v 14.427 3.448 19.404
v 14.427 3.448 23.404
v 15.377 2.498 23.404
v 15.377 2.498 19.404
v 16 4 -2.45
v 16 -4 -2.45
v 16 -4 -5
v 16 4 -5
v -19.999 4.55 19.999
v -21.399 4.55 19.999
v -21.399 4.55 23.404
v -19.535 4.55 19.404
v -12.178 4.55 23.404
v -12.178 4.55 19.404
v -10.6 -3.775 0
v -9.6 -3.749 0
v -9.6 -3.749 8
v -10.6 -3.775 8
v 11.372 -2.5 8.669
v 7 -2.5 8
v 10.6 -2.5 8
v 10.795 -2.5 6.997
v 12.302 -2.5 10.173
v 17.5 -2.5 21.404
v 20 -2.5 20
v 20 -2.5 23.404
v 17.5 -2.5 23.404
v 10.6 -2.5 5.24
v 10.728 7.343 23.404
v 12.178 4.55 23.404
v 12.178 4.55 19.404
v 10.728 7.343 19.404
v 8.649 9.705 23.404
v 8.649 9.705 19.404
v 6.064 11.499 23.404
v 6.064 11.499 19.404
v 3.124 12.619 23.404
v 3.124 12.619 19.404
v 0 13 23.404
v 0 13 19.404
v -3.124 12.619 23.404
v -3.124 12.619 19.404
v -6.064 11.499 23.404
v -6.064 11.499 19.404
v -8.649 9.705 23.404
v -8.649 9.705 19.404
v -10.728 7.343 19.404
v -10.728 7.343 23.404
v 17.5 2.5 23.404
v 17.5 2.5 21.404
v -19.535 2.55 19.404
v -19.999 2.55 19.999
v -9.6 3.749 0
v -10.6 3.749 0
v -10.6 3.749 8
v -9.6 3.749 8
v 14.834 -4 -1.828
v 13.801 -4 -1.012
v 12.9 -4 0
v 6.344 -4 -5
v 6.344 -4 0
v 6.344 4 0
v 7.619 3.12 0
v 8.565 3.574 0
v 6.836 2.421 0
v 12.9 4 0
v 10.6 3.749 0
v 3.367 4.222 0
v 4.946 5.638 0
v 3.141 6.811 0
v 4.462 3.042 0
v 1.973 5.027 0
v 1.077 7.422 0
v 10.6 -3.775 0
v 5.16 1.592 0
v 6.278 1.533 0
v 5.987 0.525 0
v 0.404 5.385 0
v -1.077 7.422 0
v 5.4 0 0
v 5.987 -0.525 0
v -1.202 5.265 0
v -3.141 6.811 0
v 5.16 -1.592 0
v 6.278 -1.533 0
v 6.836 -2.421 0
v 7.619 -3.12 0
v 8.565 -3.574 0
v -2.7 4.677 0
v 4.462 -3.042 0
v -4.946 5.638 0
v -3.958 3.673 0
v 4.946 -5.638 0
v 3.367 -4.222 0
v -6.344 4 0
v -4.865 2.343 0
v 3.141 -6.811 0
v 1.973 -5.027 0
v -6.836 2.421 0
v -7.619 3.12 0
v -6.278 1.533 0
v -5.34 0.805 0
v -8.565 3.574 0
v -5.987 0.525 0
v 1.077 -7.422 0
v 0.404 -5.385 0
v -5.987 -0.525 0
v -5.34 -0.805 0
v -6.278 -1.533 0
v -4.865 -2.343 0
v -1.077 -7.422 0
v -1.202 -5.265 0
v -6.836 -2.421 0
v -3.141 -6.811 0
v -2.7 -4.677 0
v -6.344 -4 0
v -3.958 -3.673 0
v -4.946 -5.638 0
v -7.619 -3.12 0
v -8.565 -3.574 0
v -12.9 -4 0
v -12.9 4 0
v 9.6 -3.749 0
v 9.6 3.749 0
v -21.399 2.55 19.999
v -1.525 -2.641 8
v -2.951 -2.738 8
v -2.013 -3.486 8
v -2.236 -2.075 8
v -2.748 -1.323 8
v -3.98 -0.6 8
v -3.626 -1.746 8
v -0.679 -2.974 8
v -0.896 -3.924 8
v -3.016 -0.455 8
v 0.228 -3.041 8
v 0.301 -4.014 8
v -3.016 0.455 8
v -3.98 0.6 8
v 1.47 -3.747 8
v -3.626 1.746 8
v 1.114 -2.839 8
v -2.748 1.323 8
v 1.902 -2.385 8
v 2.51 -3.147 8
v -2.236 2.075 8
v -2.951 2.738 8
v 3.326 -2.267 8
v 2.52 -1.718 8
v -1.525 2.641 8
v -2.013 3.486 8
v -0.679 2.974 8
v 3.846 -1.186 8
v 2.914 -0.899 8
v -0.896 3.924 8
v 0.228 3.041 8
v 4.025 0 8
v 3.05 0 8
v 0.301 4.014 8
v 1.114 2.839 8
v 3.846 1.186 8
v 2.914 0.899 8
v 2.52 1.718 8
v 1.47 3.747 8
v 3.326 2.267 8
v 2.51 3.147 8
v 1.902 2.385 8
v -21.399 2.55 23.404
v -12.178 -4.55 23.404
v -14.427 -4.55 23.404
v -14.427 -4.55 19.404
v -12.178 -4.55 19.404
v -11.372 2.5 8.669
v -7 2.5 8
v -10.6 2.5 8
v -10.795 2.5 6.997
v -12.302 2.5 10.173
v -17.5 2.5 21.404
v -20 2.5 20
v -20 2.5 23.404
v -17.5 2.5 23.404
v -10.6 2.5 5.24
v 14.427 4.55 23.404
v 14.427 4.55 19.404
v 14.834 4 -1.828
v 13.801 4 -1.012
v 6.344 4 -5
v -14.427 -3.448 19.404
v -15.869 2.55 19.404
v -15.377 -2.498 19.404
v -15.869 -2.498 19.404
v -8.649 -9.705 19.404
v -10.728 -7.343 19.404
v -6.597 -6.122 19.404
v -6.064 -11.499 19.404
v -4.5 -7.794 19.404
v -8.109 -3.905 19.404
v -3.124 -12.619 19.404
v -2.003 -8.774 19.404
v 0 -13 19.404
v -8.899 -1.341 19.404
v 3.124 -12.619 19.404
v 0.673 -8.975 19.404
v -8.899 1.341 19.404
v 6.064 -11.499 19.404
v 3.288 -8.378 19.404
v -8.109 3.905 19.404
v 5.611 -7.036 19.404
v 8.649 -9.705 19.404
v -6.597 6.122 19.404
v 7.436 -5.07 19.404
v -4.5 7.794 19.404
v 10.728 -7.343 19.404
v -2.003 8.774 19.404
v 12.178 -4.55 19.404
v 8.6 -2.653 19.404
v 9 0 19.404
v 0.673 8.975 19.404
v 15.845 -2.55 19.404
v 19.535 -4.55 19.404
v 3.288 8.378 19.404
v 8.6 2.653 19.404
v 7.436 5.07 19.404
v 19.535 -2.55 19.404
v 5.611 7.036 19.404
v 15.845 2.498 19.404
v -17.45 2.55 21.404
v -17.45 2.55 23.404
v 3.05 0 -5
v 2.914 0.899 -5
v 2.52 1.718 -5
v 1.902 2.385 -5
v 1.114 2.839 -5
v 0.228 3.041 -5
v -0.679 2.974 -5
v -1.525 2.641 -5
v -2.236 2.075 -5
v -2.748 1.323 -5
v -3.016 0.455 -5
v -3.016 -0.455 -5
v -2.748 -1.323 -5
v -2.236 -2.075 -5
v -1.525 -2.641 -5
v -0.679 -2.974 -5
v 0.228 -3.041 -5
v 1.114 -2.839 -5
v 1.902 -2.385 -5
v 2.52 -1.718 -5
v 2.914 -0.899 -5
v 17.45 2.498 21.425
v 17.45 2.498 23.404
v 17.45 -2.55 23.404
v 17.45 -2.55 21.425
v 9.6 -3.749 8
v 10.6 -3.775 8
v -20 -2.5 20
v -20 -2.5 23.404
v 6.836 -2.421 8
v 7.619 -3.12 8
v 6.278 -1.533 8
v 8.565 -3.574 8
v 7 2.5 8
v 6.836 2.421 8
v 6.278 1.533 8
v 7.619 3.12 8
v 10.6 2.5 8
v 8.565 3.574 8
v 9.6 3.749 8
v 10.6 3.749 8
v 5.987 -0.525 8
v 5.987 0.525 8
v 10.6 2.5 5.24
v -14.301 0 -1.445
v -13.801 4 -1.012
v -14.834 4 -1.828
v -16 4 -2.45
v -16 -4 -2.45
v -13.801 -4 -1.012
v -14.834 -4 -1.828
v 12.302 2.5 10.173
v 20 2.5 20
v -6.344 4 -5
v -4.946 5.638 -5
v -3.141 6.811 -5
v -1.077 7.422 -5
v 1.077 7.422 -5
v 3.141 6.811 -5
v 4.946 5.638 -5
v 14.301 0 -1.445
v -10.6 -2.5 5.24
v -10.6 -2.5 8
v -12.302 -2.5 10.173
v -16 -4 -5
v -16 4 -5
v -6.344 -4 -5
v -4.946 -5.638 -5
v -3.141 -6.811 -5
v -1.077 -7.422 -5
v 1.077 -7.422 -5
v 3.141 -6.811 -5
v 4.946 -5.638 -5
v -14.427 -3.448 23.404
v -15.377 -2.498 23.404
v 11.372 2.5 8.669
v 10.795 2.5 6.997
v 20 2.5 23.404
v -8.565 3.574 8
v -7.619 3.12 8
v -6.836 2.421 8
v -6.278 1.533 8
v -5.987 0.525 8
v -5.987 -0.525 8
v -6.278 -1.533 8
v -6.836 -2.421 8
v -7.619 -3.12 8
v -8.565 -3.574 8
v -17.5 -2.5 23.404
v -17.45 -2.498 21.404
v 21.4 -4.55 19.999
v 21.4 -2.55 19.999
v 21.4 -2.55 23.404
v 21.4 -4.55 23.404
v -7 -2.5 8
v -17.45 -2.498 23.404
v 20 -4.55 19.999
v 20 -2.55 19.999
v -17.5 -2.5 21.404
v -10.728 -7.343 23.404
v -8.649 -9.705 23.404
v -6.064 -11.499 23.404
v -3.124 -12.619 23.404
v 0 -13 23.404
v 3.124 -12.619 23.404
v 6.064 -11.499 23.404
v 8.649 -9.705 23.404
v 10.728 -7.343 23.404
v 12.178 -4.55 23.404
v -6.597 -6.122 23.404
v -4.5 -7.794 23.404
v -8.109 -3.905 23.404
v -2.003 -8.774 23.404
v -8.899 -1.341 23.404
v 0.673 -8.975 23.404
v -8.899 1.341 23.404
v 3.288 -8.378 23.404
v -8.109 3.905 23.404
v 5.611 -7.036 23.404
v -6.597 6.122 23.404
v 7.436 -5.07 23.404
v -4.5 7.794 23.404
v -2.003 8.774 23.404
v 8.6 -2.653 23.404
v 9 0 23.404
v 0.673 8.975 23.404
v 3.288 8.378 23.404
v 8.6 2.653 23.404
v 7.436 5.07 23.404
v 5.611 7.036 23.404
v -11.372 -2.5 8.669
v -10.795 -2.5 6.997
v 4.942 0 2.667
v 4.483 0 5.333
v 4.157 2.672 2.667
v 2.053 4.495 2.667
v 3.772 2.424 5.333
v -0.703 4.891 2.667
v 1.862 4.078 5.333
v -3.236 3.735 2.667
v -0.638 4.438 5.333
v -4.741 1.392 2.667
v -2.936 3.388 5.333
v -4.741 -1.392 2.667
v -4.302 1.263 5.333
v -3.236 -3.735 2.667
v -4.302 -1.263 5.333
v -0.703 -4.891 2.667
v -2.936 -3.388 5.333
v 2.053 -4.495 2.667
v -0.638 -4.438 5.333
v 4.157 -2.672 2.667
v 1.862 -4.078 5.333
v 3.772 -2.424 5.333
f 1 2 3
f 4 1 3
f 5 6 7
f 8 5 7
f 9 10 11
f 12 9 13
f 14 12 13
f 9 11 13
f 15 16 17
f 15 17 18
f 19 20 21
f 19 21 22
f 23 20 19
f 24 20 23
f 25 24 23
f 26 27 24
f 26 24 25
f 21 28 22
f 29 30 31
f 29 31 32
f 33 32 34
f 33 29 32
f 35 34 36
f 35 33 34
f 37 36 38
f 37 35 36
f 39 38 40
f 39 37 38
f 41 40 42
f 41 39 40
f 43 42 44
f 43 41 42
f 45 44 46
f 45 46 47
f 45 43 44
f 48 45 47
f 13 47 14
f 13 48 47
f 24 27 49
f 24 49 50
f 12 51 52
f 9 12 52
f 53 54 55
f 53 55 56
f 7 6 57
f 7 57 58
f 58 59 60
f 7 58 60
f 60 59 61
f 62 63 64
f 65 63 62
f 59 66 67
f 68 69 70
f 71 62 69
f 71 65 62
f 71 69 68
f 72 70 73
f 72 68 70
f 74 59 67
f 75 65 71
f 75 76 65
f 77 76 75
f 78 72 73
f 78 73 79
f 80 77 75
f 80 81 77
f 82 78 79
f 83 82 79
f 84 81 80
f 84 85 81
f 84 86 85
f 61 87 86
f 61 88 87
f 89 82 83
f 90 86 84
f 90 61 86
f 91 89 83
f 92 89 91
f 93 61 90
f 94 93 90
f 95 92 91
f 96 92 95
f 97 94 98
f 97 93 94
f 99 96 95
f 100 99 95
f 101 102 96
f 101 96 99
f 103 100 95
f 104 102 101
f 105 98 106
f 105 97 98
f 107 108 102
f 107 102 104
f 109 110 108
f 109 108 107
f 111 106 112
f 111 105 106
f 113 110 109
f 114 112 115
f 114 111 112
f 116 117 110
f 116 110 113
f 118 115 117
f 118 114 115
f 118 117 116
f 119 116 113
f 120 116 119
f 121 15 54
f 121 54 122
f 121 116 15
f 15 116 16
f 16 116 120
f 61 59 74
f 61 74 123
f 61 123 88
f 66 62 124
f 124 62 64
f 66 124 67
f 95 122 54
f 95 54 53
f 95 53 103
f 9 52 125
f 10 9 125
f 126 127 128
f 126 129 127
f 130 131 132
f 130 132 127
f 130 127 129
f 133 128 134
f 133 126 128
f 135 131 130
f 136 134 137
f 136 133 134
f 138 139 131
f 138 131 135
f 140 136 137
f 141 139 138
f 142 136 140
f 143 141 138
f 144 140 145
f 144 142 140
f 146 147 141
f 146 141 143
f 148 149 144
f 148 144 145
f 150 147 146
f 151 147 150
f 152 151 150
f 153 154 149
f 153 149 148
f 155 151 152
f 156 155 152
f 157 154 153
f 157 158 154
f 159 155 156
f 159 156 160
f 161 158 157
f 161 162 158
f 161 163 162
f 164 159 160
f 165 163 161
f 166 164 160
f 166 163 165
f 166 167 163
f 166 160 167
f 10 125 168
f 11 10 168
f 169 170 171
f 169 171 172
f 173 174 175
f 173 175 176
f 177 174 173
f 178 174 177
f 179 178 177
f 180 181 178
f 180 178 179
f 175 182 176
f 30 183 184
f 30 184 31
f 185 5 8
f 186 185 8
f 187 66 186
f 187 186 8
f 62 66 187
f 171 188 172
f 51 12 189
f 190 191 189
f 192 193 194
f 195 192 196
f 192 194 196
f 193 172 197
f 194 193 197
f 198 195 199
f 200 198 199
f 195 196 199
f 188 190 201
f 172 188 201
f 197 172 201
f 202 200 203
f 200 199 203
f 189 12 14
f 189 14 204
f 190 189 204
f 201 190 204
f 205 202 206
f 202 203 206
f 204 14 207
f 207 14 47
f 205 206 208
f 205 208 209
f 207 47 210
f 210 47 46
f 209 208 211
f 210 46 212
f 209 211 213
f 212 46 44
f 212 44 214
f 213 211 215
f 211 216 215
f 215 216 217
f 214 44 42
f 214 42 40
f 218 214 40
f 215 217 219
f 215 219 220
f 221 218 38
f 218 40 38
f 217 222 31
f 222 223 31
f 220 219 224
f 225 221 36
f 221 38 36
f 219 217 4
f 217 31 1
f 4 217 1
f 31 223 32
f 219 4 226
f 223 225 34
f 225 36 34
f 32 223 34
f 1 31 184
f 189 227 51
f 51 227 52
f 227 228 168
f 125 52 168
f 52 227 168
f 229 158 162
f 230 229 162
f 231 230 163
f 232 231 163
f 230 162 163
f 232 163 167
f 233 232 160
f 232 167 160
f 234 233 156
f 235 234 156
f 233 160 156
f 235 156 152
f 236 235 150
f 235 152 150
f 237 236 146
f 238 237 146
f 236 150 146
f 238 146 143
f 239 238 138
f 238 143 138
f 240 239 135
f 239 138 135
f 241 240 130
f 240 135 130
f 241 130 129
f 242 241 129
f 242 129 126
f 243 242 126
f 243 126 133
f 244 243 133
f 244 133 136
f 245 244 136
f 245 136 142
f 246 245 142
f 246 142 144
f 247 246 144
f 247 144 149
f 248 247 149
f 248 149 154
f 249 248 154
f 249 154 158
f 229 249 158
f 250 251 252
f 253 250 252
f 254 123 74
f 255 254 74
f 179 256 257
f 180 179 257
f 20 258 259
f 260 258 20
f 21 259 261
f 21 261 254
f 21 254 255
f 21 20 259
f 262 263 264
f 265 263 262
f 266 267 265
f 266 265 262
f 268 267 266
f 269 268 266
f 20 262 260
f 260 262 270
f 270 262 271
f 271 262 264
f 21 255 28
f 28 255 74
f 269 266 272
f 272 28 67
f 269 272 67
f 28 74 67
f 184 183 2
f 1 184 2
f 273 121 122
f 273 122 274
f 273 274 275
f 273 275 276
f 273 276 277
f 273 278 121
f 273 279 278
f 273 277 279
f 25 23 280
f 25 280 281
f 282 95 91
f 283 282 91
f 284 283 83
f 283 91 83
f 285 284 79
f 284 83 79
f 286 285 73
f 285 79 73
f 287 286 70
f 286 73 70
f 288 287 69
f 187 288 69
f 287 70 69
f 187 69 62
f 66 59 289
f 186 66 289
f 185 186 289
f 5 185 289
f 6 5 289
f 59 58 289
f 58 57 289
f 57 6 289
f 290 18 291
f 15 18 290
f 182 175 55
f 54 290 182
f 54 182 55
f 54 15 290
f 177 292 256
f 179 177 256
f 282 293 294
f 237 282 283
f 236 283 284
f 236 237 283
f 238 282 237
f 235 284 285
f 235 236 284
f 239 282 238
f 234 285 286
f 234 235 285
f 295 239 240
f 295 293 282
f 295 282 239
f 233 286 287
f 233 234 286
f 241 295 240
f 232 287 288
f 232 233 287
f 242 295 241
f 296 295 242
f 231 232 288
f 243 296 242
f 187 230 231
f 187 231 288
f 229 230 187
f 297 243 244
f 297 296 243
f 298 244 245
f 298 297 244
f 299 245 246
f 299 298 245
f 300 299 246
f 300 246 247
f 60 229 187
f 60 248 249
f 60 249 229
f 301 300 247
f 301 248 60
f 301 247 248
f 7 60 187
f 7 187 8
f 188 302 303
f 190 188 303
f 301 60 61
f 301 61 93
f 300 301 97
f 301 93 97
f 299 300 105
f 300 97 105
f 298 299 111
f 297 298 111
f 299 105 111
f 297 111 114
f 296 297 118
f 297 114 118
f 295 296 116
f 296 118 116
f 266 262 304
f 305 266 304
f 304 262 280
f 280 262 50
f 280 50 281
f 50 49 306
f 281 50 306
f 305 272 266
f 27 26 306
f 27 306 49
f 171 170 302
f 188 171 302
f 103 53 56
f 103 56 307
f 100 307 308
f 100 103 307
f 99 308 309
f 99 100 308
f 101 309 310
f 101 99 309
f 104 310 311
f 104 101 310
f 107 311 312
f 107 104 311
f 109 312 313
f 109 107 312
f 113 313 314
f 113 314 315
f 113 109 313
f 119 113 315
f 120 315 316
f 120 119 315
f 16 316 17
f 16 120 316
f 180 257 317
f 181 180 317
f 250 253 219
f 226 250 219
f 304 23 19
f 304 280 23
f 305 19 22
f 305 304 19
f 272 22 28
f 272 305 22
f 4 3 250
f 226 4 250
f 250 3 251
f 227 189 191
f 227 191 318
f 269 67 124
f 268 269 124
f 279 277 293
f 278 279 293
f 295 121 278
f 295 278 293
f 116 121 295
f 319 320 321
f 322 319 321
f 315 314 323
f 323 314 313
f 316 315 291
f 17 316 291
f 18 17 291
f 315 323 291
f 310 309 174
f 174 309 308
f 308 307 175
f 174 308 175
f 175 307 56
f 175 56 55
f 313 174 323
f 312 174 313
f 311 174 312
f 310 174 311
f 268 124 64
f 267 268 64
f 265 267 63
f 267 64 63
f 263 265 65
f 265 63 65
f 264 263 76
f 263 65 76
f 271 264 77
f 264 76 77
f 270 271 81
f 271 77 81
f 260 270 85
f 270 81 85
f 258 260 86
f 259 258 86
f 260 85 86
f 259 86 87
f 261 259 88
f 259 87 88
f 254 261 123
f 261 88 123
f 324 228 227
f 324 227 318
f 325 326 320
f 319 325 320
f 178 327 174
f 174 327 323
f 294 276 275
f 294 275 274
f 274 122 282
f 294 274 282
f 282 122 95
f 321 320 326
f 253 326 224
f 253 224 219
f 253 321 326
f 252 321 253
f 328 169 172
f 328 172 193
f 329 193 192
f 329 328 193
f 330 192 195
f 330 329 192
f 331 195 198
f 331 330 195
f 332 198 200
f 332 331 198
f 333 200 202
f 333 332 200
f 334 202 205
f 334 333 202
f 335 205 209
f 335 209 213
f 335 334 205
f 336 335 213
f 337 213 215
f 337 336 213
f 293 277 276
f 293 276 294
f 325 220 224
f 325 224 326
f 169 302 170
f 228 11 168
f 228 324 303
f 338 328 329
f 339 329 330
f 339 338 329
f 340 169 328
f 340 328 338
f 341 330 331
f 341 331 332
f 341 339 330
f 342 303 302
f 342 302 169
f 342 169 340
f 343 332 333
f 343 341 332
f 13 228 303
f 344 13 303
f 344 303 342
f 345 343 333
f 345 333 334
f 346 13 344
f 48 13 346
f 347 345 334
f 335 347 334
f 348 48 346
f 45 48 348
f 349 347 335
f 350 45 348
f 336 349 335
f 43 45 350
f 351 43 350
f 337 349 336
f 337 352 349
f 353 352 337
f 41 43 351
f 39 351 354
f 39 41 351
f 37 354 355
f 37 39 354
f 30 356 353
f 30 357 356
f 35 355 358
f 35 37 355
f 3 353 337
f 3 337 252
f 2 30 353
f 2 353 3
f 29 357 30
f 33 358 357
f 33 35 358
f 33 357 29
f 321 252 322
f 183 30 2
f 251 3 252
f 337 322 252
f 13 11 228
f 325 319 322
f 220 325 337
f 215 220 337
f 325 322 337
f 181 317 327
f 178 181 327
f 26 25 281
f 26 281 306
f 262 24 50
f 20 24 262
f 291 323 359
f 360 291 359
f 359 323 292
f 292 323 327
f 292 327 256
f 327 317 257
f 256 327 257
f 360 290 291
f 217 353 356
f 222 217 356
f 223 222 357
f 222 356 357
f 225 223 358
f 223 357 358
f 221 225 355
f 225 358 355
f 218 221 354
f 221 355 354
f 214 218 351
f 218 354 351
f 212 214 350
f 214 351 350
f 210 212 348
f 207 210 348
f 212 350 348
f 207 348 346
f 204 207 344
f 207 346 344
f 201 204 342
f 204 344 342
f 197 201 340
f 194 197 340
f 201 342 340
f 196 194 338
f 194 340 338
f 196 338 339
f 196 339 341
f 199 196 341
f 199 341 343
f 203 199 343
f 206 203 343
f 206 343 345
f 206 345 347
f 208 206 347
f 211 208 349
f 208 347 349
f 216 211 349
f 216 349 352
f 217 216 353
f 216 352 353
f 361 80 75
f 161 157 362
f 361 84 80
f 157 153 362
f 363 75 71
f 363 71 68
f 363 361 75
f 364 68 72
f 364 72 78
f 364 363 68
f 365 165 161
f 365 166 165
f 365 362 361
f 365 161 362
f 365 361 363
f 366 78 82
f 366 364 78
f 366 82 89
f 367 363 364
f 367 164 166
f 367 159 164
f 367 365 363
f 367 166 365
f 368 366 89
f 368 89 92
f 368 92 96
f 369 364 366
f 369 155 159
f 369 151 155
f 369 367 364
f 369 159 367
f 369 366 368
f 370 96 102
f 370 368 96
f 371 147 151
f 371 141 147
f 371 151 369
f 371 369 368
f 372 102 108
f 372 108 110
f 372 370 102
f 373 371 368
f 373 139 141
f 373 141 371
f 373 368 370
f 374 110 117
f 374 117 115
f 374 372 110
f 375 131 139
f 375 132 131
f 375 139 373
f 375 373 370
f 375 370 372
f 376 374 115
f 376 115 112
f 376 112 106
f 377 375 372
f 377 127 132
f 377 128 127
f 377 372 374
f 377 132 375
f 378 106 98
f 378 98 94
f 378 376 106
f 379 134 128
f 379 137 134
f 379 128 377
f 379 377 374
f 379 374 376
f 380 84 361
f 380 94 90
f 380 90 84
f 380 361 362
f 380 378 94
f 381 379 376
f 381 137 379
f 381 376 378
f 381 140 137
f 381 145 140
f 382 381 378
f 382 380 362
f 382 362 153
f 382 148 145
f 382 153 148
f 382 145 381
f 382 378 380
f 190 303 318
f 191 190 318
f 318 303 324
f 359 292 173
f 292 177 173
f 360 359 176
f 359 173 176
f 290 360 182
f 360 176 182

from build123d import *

# Parameters (mm, degrees)
SKETCH_R           = 5.4
SKETCH001_R        = 4.025
SKETCH003_R        = 7.5
PAD_DEPTH          = 5
SKETCH002_R        = 3.05
POCKET_DEPTH       = 200
SKETCH004_W        = 6.5
SKETCH004_H        = 8
PAD001_DEPTH       = 5
PAD002_DEPTH       = 8
SKETCH006_W        = 2.5
SKETCH006_H        = 5
PAD003_DEPTH       = 8
PAD004_DEPTH       = 5
PAD005_DEPTH       = 8
FILLET_R           = 8
FILLET001_R        = 8
SKETCH009_R        = 9
PAD006_DEPTH       = 4
POCKET001_DEPTH    = 5.05
POCKET002_DEPTH    = 5.05
POCKET003_DEPTH    = 5
POCKET004_DEPTH    = 5
POCKET005_DEPTH    = 5
POLARPATTERN_COUNT = 2


with BuildPart() as centerig_piece:
    # Sketch → AdditiveLoft section 0
    with BuildSketch(Plane.XY):
        Circle(SKETCH_R)
    # Sketch001 (on DatumPlane) → AdditiveLoft section 1
    with BuildSketch(Plane.XY.offset(8)):
        Circle(SKETCH001_R)
    loft()

    # Sketch003 (on Face1 of AdditiveLoft) → Pad (new body)
    with BuildSketch(Plane(origin=(0, 0, 0), x_dir=(1, 0, 0), z_dir=(0, 0, -1))):
        Circle(SKETCH003_R)
    extrude(amount=PAD_DEPTH)

    # Sketch002 (on DatumPlane) → Pocket (cut)
    with BuildSketch(Plane.XY.offset(8)):
        Circle(SKETCH002_R)
    extrude(amount=-POCKET_DEPTH, mode=Mode.SUBTRACT)

    # Sketch004 (on Face2 of Pocket) → Pad001 (join)
    with BuildSketch(Plane.XY):
        with Locations((9.25, 0)):
            Rectangle(SKETCH004_W, SKETCH004_H)
    pad001 = extrude(amount=-PAD001_DEPTH)

    # Sketch005 (on Face3 of Pad001) → Pad002 (join)
    with BuildSketch(Plane.XZ.offset(4)):
        with BuildLine():
            Line((12.5, -5), (12.5, 0))
            Line((12.5, 0), (12.9, 0))
            add(Edge.make_bspline(
                [(12.9, 0), (14.151342, -1.664118), (16, -2.45)],
                knots=[0, 0, 0, 1, 1, 1], degree=2))
            Line((16, -2.45), (16, -5))
            Line((16, -5), (12.5, -5))
        make_face()
    pad002 = extrude(amount=-PAD002_DEPTH)

    # Sketch006 (on Face2 of Pad002) → Pad003 (join)
    with BuildSketch(Plane.XY):
        with Locations((9.25, 0)):
            Rectangle(SKETCH006_W, SKETCH006_H)
    pad003 = extrude(amount=PAD003_DEPTH)

    # Sketch007 (on Face9 of Pad003) → Pad004 (join)
    with BuildSketch(Plane.XZ.offset(2.5)):
        Polygon((7, 8), (10.6, 8), (20, 20), (20, 23.404255), (17.5, 23.404255), (17.5, 21.404255), align=None)
    pad004 = extrude(amount=-PAD004_DEPTH)

    # Sketch008 → Pad005 (join)
    with BuildSketch(Plane.XY):
        with BuildLine():
            ThreePointArc((9.6, 3.748666), (5.95, 0), (9.6, -3.748666))
            Line((9.6, -3.748666), (10.6, -3.775343))
            Line((10.6, -3.775343), (10.6, 3.748666))
            Line((10.6, 3.748666), (9.6, 3.748666))
        make_face()
    pad005 = extrude(amount=PAD005_DEPTH)

    # Fillet
    fillet_edges = [centerig_piece.edges().sort_by_distance(p)[0] for p in [
        (10.6, 0, 8),
    ]]
    fillet(fillet_edges, radius=FILLET_R)

    # Mirrored: Pad001, Pad002, Pad003, Pad004, Pad005 across Sketch004 V_Axis
    add(pad001.mirror(Plane(origin=(0, 0, 0), x_dir=(0, 0, 1), z_dir=(1, 0, 0))))
    add(pad002.mirror(Plane(origin=(0, 0, 0), x_dir=(0, 0, 1), z_dir=(1, 0, 0))))
    add(pad003.mirror(Plane(origin=(0, 0, 0), x_dir=(0, 0, 1), z_dir=(1, 0, 0))))
    add(pad004.mirror(Plane(origin=(0, 0, 0), x_dir=(0, 0, 1), z_dir=(1, 0, 0))))
    add(pad005.mirror(Plane(origin=(0, 0, 0), x_dir=(0, 0, 1), z_dir=(1, 0, 0))))

    # Fillet001
    fillet001_edges = [centerig_piece.edges().sort_by_distance(p)[0] for p in [
        (-10.6, 0, 8),
    ]]
    fillet(fillet001_edges, radius=FILLET001_R)


with BuildPart() as stability_ring:
    # Sketch009 (on DatumPlane) → Pad006 (new body)
    with BuildSketch(Plane.XY.offset(23.404255)):
        with BuildLine():
            ThreePointArc((12.177746, 4.55), (-1.065181, 12.956288), (-12.757351, 2.5))
            Line((-17.45, 2.5), (-12.757351, 2.5))
            Line((-17.45, 2.5), (-17.45, -2.55))
            Line((-17.45, -2.55), (-22, -2.55))
            Line((-22, -2.55), (-22, -4.55))
            Line((-22, -4.55), (-12.177746, -4.55))
            ThreePointArc((-12.177746, -4.55), (1.065181, -12.956288), (12.757351, -2.5))
            Line((17.45, -2.5), (12.757351, -2.5))
            Line((17.45, 2.55), (17.45, -2.5))
            Line((22, 2.55), (17.45, 2.55))
            Line((22, 2.55), (22, 4.55))
            Line((22, 4.55), (12.177746, 4.55))
        make_face()
        Circle(SKETCH009_R, mode=Mode.SUBTRACT)
    extrude(amount=-PAD006_DEPTH)

    # Sketch010 (on Face10 of Pad006) → Pocket001 (cut)
    with BuildSketch(Plane(origin=(0, -2.5, 23.404255), x_dir=(1, 0, 0), z_dir=(0, -1, 0))):
        Polygon((17.470894, -1.952582), (15.784162, -4.077046), (17.863272, -4.077046), align=None)
    extrude(amount=-POCKET001_DEPTH, mode=Mode.SUBTRACT)

    # Sketch011 (on Face7 of Pocket001) → Pocket002 (cut)
    with BuildSketch(Plane(origin=(0, 2.5, 23.404255), x_dir=(-1, 0, 0), z_dir=(0, 1, 0))):
        Polygon((15.814852, -4.068472), (17.467579, -1.977585), (17.988518, -4.068472), align=None)
    extrude(amount=-POCKET002_DEPTH, mode=Mode.SUBTRACT)

    # Sketch012 (on Face17 of Pocket002) → Pocket003 (cut)
    with BuildSketch(Plane(origin=(0, -2.55, 23.404255), x_dir=(-1, 0, 0), z_dir=(0, 1, 0))):
        Polygon((19.505526, -4.037285), (19.999149, -3.405484), (21.399149, -3.405484), (21.399149, 0), (22.759012, 0), (22.759012, -4.405802), align=None)
    extrude(amount=-POCKET003_DEPTH, mode=Mode.SUBTRACT)

    # Sketch013 (on Face2 of Pocket003) → Pocket004 (cut)
    with BuildSketch(Plane(origin=(0, 2.55, 23.404255), x_dir=(1, 0, 0), z_dir=(0, -1, 0))):
        Polygon((19.497252, -4.047795), (19.999849, -3.405754), (21.399849, -3.405754), (21.399849, 0), (22.496408, 0), (22.496408, -4.46575), align=None)
    extrude(amount=-POCKET004_DEPTH, mode=Mode.SUBTRACT)

    # Mirrored001: stability_ring across XZ


with BuildPart() as stability_ring_1:
    add(stability_ring.part)
    add(stability_ring.part.mirror(Plane.XZ))

    # Sketch014 (on Face27 of Mirrored001) → Pocket005 (cut)
    with BuildSketch(Plane.XY.offset(23.404255)):
        Polygon((-21.508259, -2.497821), (-21.508259, -4.812393), (-14.426693, -4.812393), (-14.426693, -3.448357), (-15.377228, -2.497821), align=None)
    pocket005 = extrude(amount=-POCKET005_DEPTH, mode=Mode.SUBTRACT)

    # PolarPattern: Pocket005 ×2 about axis
    polarpattern_axis = Axis((0, 0, 23.404255), (0, 0, 1))
    for i in range(1, POLARPATTERN_COUNT):
        add(pocket005.rotate(polarpattern_axis, i * 360 / POLARPATTERN_COUNT), mode=Mode.SUBTRACT)


solid = Compound([centerig_piece.part, stability_ring_1.part])
